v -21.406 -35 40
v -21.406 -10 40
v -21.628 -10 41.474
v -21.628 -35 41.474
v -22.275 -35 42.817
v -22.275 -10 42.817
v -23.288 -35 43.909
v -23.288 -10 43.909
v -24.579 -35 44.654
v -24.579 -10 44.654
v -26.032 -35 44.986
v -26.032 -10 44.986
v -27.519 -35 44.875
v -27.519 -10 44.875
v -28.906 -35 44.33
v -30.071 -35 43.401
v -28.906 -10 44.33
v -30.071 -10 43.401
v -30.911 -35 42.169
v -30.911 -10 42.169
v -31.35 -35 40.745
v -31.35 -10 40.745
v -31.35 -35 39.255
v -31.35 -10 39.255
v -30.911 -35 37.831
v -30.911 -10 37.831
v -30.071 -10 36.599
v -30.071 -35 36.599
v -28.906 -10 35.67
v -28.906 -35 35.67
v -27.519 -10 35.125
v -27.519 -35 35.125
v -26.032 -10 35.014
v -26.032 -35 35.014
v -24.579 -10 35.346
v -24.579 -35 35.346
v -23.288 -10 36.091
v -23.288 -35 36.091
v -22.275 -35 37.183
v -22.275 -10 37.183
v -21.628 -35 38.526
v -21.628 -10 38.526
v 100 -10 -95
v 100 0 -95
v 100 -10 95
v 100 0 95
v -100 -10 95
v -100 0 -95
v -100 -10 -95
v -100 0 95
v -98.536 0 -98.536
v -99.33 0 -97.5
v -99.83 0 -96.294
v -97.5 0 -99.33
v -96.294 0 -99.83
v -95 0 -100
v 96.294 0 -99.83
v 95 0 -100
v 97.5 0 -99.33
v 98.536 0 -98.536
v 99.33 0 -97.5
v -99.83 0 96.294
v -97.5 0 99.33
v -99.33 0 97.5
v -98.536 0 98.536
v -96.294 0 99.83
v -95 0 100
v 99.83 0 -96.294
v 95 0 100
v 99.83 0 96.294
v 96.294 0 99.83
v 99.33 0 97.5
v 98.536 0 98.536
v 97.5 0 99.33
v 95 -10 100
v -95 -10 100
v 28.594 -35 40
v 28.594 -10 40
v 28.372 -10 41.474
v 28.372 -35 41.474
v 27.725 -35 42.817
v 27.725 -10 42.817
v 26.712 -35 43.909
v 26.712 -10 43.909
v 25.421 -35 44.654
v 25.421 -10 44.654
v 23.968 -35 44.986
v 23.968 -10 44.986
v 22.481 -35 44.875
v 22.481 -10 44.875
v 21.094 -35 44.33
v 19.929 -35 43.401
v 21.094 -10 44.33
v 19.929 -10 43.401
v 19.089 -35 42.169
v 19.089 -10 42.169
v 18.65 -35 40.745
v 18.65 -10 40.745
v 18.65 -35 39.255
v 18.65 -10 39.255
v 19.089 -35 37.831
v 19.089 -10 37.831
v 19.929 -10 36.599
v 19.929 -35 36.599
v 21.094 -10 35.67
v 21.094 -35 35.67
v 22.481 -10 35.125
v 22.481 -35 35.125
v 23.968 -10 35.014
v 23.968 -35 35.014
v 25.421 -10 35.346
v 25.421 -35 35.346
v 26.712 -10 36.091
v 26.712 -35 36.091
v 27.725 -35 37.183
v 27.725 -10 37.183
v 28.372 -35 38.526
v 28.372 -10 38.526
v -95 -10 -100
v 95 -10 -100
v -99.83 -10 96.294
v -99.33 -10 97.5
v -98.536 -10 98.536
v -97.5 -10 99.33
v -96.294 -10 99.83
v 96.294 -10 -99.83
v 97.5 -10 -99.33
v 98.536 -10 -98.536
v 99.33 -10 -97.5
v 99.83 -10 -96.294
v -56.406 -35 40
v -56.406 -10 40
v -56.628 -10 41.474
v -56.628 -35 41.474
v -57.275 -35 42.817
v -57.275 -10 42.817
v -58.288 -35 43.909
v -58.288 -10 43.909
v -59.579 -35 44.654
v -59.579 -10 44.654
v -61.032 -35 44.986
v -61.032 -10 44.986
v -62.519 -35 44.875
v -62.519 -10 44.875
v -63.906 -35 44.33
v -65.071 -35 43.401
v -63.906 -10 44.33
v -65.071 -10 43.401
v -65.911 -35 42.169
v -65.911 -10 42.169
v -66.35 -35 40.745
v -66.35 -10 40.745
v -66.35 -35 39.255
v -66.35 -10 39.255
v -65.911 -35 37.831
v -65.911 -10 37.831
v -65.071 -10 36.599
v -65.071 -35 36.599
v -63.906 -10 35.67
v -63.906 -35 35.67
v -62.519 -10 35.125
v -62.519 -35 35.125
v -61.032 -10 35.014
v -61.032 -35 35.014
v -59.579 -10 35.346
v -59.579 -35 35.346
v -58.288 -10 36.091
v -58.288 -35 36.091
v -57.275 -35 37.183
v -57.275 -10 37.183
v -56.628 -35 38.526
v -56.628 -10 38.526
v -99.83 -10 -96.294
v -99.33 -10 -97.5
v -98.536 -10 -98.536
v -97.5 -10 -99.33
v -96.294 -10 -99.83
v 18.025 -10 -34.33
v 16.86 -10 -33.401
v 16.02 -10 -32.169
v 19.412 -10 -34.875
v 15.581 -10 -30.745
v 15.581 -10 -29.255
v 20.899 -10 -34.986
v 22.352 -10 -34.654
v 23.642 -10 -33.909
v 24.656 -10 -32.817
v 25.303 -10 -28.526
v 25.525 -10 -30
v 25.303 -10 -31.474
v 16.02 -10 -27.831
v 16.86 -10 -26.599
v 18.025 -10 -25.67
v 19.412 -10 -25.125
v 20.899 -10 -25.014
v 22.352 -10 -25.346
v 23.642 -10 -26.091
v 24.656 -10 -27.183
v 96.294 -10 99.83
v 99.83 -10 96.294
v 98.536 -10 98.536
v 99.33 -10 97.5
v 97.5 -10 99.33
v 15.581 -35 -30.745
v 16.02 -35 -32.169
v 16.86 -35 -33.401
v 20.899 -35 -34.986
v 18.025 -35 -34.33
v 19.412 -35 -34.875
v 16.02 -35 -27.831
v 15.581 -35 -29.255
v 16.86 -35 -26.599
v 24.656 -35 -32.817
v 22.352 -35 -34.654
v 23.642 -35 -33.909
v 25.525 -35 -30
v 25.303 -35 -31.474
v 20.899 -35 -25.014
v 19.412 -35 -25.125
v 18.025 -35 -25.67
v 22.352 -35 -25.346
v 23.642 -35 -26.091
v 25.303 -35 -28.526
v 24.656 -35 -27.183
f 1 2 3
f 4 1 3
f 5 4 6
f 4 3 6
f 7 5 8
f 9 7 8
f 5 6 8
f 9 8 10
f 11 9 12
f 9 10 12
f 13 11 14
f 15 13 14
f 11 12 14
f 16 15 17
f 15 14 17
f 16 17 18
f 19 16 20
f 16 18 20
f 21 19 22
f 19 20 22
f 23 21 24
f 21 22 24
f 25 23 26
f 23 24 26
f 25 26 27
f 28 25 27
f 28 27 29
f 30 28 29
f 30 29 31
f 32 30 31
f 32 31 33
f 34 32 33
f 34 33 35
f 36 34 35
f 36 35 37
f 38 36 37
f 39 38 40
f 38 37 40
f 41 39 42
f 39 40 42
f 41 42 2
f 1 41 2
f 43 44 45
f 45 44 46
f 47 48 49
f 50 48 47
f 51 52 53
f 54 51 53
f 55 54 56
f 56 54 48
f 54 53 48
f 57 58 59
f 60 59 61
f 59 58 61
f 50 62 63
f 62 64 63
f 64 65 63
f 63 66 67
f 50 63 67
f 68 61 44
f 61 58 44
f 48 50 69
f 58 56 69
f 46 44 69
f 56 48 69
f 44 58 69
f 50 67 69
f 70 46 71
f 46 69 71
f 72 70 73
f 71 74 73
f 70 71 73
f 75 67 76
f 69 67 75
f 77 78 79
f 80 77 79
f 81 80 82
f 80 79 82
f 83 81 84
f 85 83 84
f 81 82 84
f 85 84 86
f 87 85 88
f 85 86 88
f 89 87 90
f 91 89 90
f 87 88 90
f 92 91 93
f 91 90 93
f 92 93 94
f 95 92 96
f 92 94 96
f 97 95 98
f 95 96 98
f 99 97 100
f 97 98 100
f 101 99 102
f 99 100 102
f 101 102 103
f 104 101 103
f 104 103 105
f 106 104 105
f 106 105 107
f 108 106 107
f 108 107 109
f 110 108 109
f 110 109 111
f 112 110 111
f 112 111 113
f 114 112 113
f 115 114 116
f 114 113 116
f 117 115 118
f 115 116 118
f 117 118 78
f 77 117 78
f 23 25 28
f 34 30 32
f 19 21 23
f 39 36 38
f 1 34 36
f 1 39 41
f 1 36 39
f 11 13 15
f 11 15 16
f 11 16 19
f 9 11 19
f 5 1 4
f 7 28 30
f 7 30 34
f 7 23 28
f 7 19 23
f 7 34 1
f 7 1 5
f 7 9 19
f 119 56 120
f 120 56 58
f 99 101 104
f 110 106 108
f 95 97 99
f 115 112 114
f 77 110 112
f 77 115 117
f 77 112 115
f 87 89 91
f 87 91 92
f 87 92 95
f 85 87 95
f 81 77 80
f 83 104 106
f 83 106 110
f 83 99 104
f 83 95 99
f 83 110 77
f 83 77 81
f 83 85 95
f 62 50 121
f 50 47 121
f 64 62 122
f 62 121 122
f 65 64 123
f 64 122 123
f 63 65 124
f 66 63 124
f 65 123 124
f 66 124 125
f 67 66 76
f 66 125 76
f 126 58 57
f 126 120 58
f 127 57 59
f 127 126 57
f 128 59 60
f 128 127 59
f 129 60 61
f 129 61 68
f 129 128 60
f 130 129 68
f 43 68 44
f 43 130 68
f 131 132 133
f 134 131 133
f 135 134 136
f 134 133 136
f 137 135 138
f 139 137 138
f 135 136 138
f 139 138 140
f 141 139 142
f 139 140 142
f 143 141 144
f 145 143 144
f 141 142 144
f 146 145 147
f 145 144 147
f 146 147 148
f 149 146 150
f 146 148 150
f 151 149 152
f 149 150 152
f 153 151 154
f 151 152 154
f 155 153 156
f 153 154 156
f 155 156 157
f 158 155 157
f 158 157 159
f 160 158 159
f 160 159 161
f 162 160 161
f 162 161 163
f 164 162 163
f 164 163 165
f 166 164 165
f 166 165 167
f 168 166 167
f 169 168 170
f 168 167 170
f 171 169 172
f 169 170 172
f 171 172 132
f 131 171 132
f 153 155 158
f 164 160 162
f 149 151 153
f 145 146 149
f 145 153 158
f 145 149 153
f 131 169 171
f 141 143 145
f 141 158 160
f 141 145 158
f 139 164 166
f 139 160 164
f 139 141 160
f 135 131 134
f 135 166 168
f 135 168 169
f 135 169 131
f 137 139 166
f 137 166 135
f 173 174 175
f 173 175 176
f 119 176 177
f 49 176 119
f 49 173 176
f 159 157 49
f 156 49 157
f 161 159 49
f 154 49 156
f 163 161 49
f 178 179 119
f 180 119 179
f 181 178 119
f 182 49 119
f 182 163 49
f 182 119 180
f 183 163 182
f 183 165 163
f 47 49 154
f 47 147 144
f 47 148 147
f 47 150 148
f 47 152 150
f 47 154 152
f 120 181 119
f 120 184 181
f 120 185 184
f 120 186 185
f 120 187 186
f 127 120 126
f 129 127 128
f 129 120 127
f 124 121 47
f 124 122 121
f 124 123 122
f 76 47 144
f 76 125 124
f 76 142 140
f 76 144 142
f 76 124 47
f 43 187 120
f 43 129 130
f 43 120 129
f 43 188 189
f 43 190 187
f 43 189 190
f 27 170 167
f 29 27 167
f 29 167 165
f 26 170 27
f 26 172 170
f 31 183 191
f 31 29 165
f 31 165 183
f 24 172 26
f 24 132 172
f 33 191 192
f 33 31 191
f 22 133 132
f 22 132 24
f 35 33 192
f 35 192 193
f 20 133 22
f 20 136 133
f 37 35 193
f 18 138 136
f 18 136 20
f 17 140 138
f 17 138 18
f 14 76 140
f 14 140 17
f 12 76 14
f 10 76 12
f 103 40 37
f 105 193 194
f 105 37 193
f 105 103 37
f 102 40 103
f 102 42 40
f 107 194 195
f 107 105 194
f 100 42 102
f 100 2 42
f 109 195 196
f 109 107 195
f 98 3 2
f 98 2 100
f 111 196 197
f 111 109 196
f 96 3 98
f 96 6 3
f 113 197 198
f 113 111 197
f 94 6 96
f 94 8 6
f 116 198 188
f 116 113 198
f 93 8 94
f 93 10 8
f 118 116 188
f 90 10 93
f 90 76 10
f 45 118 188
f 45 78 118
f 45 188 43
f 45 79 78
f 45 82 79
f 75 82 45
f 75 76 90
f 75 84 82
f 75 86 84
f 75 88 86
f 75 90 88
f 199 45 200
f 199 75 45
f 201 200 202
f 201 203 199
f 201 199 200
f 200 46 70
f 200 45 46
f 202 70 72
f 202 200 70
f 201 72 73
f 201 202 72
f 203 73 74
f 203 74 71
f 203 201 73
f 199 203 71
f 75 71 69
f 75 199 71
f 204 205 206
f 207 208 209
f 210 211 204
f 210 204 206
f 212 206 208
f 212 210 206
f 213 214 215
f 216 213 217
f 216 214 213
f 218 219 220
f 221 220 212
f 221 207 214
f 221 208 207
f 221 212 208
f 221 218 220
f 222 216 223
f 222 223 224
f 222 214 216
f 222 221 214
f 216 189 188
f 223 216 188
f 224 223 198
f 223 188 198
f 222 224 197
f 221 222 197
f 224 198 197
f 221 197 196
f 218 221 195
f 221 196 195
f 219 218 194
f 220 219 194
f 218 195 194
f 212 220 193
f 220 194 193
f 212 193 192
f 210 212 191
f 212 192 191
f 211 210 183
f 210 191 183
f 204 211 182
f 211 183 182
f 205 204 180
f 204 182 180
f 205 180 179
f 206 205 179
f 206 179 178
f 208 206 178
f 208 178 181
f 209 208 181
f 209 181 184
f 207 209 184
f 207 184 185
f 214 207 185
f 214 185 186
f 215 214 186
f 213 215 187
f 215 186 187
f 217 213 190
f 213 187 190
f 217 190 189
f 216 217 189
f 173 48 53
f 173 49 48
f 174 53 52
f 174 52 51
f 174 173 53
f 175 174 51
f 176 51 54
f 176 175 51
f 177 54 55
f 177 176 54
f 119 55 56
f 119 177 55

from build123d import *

# Parameters (mm, degrees)
F0_W     = 200
F0_H     = 200
F1_DEPTH = 10
F2_R     = 5
F3_R     = 5
F4_DEPTH = 25


with BuildPart() as f1:
    # F0 (on Front) → F1 (new body)
    with BuildSketch(Plane.XZ):
        Rectangle(F0_W, F0_H)
    extrude(amount=F1_DEPTH)

    # F2
    f2_edges = [f1.edges().sort_by_distance(p)[0] for p in [
        (-100, -5, 100),
        (-100, -5, -100),
        (100, -5, -100),
        (100, -5, 100),
    ]]
    fillet(f2_edges, radius=F2_R)

    # F3 (on face) → F4 (join)
    with BuildSketch(Plane.XZ.offset(10)):
        with Locations((-61.405938, 40)):
            Circle(F3_R)
        with Locations((-26.405938, 40)):
            Circle(F3_R)
        with Locations((23.594062, 40)):
            Circle(F3_R)
        with Locations((20.524925, -30)):
            Circle(F3_R)
    extrude(amount=F4_DEPTH)


solid = f1.part
